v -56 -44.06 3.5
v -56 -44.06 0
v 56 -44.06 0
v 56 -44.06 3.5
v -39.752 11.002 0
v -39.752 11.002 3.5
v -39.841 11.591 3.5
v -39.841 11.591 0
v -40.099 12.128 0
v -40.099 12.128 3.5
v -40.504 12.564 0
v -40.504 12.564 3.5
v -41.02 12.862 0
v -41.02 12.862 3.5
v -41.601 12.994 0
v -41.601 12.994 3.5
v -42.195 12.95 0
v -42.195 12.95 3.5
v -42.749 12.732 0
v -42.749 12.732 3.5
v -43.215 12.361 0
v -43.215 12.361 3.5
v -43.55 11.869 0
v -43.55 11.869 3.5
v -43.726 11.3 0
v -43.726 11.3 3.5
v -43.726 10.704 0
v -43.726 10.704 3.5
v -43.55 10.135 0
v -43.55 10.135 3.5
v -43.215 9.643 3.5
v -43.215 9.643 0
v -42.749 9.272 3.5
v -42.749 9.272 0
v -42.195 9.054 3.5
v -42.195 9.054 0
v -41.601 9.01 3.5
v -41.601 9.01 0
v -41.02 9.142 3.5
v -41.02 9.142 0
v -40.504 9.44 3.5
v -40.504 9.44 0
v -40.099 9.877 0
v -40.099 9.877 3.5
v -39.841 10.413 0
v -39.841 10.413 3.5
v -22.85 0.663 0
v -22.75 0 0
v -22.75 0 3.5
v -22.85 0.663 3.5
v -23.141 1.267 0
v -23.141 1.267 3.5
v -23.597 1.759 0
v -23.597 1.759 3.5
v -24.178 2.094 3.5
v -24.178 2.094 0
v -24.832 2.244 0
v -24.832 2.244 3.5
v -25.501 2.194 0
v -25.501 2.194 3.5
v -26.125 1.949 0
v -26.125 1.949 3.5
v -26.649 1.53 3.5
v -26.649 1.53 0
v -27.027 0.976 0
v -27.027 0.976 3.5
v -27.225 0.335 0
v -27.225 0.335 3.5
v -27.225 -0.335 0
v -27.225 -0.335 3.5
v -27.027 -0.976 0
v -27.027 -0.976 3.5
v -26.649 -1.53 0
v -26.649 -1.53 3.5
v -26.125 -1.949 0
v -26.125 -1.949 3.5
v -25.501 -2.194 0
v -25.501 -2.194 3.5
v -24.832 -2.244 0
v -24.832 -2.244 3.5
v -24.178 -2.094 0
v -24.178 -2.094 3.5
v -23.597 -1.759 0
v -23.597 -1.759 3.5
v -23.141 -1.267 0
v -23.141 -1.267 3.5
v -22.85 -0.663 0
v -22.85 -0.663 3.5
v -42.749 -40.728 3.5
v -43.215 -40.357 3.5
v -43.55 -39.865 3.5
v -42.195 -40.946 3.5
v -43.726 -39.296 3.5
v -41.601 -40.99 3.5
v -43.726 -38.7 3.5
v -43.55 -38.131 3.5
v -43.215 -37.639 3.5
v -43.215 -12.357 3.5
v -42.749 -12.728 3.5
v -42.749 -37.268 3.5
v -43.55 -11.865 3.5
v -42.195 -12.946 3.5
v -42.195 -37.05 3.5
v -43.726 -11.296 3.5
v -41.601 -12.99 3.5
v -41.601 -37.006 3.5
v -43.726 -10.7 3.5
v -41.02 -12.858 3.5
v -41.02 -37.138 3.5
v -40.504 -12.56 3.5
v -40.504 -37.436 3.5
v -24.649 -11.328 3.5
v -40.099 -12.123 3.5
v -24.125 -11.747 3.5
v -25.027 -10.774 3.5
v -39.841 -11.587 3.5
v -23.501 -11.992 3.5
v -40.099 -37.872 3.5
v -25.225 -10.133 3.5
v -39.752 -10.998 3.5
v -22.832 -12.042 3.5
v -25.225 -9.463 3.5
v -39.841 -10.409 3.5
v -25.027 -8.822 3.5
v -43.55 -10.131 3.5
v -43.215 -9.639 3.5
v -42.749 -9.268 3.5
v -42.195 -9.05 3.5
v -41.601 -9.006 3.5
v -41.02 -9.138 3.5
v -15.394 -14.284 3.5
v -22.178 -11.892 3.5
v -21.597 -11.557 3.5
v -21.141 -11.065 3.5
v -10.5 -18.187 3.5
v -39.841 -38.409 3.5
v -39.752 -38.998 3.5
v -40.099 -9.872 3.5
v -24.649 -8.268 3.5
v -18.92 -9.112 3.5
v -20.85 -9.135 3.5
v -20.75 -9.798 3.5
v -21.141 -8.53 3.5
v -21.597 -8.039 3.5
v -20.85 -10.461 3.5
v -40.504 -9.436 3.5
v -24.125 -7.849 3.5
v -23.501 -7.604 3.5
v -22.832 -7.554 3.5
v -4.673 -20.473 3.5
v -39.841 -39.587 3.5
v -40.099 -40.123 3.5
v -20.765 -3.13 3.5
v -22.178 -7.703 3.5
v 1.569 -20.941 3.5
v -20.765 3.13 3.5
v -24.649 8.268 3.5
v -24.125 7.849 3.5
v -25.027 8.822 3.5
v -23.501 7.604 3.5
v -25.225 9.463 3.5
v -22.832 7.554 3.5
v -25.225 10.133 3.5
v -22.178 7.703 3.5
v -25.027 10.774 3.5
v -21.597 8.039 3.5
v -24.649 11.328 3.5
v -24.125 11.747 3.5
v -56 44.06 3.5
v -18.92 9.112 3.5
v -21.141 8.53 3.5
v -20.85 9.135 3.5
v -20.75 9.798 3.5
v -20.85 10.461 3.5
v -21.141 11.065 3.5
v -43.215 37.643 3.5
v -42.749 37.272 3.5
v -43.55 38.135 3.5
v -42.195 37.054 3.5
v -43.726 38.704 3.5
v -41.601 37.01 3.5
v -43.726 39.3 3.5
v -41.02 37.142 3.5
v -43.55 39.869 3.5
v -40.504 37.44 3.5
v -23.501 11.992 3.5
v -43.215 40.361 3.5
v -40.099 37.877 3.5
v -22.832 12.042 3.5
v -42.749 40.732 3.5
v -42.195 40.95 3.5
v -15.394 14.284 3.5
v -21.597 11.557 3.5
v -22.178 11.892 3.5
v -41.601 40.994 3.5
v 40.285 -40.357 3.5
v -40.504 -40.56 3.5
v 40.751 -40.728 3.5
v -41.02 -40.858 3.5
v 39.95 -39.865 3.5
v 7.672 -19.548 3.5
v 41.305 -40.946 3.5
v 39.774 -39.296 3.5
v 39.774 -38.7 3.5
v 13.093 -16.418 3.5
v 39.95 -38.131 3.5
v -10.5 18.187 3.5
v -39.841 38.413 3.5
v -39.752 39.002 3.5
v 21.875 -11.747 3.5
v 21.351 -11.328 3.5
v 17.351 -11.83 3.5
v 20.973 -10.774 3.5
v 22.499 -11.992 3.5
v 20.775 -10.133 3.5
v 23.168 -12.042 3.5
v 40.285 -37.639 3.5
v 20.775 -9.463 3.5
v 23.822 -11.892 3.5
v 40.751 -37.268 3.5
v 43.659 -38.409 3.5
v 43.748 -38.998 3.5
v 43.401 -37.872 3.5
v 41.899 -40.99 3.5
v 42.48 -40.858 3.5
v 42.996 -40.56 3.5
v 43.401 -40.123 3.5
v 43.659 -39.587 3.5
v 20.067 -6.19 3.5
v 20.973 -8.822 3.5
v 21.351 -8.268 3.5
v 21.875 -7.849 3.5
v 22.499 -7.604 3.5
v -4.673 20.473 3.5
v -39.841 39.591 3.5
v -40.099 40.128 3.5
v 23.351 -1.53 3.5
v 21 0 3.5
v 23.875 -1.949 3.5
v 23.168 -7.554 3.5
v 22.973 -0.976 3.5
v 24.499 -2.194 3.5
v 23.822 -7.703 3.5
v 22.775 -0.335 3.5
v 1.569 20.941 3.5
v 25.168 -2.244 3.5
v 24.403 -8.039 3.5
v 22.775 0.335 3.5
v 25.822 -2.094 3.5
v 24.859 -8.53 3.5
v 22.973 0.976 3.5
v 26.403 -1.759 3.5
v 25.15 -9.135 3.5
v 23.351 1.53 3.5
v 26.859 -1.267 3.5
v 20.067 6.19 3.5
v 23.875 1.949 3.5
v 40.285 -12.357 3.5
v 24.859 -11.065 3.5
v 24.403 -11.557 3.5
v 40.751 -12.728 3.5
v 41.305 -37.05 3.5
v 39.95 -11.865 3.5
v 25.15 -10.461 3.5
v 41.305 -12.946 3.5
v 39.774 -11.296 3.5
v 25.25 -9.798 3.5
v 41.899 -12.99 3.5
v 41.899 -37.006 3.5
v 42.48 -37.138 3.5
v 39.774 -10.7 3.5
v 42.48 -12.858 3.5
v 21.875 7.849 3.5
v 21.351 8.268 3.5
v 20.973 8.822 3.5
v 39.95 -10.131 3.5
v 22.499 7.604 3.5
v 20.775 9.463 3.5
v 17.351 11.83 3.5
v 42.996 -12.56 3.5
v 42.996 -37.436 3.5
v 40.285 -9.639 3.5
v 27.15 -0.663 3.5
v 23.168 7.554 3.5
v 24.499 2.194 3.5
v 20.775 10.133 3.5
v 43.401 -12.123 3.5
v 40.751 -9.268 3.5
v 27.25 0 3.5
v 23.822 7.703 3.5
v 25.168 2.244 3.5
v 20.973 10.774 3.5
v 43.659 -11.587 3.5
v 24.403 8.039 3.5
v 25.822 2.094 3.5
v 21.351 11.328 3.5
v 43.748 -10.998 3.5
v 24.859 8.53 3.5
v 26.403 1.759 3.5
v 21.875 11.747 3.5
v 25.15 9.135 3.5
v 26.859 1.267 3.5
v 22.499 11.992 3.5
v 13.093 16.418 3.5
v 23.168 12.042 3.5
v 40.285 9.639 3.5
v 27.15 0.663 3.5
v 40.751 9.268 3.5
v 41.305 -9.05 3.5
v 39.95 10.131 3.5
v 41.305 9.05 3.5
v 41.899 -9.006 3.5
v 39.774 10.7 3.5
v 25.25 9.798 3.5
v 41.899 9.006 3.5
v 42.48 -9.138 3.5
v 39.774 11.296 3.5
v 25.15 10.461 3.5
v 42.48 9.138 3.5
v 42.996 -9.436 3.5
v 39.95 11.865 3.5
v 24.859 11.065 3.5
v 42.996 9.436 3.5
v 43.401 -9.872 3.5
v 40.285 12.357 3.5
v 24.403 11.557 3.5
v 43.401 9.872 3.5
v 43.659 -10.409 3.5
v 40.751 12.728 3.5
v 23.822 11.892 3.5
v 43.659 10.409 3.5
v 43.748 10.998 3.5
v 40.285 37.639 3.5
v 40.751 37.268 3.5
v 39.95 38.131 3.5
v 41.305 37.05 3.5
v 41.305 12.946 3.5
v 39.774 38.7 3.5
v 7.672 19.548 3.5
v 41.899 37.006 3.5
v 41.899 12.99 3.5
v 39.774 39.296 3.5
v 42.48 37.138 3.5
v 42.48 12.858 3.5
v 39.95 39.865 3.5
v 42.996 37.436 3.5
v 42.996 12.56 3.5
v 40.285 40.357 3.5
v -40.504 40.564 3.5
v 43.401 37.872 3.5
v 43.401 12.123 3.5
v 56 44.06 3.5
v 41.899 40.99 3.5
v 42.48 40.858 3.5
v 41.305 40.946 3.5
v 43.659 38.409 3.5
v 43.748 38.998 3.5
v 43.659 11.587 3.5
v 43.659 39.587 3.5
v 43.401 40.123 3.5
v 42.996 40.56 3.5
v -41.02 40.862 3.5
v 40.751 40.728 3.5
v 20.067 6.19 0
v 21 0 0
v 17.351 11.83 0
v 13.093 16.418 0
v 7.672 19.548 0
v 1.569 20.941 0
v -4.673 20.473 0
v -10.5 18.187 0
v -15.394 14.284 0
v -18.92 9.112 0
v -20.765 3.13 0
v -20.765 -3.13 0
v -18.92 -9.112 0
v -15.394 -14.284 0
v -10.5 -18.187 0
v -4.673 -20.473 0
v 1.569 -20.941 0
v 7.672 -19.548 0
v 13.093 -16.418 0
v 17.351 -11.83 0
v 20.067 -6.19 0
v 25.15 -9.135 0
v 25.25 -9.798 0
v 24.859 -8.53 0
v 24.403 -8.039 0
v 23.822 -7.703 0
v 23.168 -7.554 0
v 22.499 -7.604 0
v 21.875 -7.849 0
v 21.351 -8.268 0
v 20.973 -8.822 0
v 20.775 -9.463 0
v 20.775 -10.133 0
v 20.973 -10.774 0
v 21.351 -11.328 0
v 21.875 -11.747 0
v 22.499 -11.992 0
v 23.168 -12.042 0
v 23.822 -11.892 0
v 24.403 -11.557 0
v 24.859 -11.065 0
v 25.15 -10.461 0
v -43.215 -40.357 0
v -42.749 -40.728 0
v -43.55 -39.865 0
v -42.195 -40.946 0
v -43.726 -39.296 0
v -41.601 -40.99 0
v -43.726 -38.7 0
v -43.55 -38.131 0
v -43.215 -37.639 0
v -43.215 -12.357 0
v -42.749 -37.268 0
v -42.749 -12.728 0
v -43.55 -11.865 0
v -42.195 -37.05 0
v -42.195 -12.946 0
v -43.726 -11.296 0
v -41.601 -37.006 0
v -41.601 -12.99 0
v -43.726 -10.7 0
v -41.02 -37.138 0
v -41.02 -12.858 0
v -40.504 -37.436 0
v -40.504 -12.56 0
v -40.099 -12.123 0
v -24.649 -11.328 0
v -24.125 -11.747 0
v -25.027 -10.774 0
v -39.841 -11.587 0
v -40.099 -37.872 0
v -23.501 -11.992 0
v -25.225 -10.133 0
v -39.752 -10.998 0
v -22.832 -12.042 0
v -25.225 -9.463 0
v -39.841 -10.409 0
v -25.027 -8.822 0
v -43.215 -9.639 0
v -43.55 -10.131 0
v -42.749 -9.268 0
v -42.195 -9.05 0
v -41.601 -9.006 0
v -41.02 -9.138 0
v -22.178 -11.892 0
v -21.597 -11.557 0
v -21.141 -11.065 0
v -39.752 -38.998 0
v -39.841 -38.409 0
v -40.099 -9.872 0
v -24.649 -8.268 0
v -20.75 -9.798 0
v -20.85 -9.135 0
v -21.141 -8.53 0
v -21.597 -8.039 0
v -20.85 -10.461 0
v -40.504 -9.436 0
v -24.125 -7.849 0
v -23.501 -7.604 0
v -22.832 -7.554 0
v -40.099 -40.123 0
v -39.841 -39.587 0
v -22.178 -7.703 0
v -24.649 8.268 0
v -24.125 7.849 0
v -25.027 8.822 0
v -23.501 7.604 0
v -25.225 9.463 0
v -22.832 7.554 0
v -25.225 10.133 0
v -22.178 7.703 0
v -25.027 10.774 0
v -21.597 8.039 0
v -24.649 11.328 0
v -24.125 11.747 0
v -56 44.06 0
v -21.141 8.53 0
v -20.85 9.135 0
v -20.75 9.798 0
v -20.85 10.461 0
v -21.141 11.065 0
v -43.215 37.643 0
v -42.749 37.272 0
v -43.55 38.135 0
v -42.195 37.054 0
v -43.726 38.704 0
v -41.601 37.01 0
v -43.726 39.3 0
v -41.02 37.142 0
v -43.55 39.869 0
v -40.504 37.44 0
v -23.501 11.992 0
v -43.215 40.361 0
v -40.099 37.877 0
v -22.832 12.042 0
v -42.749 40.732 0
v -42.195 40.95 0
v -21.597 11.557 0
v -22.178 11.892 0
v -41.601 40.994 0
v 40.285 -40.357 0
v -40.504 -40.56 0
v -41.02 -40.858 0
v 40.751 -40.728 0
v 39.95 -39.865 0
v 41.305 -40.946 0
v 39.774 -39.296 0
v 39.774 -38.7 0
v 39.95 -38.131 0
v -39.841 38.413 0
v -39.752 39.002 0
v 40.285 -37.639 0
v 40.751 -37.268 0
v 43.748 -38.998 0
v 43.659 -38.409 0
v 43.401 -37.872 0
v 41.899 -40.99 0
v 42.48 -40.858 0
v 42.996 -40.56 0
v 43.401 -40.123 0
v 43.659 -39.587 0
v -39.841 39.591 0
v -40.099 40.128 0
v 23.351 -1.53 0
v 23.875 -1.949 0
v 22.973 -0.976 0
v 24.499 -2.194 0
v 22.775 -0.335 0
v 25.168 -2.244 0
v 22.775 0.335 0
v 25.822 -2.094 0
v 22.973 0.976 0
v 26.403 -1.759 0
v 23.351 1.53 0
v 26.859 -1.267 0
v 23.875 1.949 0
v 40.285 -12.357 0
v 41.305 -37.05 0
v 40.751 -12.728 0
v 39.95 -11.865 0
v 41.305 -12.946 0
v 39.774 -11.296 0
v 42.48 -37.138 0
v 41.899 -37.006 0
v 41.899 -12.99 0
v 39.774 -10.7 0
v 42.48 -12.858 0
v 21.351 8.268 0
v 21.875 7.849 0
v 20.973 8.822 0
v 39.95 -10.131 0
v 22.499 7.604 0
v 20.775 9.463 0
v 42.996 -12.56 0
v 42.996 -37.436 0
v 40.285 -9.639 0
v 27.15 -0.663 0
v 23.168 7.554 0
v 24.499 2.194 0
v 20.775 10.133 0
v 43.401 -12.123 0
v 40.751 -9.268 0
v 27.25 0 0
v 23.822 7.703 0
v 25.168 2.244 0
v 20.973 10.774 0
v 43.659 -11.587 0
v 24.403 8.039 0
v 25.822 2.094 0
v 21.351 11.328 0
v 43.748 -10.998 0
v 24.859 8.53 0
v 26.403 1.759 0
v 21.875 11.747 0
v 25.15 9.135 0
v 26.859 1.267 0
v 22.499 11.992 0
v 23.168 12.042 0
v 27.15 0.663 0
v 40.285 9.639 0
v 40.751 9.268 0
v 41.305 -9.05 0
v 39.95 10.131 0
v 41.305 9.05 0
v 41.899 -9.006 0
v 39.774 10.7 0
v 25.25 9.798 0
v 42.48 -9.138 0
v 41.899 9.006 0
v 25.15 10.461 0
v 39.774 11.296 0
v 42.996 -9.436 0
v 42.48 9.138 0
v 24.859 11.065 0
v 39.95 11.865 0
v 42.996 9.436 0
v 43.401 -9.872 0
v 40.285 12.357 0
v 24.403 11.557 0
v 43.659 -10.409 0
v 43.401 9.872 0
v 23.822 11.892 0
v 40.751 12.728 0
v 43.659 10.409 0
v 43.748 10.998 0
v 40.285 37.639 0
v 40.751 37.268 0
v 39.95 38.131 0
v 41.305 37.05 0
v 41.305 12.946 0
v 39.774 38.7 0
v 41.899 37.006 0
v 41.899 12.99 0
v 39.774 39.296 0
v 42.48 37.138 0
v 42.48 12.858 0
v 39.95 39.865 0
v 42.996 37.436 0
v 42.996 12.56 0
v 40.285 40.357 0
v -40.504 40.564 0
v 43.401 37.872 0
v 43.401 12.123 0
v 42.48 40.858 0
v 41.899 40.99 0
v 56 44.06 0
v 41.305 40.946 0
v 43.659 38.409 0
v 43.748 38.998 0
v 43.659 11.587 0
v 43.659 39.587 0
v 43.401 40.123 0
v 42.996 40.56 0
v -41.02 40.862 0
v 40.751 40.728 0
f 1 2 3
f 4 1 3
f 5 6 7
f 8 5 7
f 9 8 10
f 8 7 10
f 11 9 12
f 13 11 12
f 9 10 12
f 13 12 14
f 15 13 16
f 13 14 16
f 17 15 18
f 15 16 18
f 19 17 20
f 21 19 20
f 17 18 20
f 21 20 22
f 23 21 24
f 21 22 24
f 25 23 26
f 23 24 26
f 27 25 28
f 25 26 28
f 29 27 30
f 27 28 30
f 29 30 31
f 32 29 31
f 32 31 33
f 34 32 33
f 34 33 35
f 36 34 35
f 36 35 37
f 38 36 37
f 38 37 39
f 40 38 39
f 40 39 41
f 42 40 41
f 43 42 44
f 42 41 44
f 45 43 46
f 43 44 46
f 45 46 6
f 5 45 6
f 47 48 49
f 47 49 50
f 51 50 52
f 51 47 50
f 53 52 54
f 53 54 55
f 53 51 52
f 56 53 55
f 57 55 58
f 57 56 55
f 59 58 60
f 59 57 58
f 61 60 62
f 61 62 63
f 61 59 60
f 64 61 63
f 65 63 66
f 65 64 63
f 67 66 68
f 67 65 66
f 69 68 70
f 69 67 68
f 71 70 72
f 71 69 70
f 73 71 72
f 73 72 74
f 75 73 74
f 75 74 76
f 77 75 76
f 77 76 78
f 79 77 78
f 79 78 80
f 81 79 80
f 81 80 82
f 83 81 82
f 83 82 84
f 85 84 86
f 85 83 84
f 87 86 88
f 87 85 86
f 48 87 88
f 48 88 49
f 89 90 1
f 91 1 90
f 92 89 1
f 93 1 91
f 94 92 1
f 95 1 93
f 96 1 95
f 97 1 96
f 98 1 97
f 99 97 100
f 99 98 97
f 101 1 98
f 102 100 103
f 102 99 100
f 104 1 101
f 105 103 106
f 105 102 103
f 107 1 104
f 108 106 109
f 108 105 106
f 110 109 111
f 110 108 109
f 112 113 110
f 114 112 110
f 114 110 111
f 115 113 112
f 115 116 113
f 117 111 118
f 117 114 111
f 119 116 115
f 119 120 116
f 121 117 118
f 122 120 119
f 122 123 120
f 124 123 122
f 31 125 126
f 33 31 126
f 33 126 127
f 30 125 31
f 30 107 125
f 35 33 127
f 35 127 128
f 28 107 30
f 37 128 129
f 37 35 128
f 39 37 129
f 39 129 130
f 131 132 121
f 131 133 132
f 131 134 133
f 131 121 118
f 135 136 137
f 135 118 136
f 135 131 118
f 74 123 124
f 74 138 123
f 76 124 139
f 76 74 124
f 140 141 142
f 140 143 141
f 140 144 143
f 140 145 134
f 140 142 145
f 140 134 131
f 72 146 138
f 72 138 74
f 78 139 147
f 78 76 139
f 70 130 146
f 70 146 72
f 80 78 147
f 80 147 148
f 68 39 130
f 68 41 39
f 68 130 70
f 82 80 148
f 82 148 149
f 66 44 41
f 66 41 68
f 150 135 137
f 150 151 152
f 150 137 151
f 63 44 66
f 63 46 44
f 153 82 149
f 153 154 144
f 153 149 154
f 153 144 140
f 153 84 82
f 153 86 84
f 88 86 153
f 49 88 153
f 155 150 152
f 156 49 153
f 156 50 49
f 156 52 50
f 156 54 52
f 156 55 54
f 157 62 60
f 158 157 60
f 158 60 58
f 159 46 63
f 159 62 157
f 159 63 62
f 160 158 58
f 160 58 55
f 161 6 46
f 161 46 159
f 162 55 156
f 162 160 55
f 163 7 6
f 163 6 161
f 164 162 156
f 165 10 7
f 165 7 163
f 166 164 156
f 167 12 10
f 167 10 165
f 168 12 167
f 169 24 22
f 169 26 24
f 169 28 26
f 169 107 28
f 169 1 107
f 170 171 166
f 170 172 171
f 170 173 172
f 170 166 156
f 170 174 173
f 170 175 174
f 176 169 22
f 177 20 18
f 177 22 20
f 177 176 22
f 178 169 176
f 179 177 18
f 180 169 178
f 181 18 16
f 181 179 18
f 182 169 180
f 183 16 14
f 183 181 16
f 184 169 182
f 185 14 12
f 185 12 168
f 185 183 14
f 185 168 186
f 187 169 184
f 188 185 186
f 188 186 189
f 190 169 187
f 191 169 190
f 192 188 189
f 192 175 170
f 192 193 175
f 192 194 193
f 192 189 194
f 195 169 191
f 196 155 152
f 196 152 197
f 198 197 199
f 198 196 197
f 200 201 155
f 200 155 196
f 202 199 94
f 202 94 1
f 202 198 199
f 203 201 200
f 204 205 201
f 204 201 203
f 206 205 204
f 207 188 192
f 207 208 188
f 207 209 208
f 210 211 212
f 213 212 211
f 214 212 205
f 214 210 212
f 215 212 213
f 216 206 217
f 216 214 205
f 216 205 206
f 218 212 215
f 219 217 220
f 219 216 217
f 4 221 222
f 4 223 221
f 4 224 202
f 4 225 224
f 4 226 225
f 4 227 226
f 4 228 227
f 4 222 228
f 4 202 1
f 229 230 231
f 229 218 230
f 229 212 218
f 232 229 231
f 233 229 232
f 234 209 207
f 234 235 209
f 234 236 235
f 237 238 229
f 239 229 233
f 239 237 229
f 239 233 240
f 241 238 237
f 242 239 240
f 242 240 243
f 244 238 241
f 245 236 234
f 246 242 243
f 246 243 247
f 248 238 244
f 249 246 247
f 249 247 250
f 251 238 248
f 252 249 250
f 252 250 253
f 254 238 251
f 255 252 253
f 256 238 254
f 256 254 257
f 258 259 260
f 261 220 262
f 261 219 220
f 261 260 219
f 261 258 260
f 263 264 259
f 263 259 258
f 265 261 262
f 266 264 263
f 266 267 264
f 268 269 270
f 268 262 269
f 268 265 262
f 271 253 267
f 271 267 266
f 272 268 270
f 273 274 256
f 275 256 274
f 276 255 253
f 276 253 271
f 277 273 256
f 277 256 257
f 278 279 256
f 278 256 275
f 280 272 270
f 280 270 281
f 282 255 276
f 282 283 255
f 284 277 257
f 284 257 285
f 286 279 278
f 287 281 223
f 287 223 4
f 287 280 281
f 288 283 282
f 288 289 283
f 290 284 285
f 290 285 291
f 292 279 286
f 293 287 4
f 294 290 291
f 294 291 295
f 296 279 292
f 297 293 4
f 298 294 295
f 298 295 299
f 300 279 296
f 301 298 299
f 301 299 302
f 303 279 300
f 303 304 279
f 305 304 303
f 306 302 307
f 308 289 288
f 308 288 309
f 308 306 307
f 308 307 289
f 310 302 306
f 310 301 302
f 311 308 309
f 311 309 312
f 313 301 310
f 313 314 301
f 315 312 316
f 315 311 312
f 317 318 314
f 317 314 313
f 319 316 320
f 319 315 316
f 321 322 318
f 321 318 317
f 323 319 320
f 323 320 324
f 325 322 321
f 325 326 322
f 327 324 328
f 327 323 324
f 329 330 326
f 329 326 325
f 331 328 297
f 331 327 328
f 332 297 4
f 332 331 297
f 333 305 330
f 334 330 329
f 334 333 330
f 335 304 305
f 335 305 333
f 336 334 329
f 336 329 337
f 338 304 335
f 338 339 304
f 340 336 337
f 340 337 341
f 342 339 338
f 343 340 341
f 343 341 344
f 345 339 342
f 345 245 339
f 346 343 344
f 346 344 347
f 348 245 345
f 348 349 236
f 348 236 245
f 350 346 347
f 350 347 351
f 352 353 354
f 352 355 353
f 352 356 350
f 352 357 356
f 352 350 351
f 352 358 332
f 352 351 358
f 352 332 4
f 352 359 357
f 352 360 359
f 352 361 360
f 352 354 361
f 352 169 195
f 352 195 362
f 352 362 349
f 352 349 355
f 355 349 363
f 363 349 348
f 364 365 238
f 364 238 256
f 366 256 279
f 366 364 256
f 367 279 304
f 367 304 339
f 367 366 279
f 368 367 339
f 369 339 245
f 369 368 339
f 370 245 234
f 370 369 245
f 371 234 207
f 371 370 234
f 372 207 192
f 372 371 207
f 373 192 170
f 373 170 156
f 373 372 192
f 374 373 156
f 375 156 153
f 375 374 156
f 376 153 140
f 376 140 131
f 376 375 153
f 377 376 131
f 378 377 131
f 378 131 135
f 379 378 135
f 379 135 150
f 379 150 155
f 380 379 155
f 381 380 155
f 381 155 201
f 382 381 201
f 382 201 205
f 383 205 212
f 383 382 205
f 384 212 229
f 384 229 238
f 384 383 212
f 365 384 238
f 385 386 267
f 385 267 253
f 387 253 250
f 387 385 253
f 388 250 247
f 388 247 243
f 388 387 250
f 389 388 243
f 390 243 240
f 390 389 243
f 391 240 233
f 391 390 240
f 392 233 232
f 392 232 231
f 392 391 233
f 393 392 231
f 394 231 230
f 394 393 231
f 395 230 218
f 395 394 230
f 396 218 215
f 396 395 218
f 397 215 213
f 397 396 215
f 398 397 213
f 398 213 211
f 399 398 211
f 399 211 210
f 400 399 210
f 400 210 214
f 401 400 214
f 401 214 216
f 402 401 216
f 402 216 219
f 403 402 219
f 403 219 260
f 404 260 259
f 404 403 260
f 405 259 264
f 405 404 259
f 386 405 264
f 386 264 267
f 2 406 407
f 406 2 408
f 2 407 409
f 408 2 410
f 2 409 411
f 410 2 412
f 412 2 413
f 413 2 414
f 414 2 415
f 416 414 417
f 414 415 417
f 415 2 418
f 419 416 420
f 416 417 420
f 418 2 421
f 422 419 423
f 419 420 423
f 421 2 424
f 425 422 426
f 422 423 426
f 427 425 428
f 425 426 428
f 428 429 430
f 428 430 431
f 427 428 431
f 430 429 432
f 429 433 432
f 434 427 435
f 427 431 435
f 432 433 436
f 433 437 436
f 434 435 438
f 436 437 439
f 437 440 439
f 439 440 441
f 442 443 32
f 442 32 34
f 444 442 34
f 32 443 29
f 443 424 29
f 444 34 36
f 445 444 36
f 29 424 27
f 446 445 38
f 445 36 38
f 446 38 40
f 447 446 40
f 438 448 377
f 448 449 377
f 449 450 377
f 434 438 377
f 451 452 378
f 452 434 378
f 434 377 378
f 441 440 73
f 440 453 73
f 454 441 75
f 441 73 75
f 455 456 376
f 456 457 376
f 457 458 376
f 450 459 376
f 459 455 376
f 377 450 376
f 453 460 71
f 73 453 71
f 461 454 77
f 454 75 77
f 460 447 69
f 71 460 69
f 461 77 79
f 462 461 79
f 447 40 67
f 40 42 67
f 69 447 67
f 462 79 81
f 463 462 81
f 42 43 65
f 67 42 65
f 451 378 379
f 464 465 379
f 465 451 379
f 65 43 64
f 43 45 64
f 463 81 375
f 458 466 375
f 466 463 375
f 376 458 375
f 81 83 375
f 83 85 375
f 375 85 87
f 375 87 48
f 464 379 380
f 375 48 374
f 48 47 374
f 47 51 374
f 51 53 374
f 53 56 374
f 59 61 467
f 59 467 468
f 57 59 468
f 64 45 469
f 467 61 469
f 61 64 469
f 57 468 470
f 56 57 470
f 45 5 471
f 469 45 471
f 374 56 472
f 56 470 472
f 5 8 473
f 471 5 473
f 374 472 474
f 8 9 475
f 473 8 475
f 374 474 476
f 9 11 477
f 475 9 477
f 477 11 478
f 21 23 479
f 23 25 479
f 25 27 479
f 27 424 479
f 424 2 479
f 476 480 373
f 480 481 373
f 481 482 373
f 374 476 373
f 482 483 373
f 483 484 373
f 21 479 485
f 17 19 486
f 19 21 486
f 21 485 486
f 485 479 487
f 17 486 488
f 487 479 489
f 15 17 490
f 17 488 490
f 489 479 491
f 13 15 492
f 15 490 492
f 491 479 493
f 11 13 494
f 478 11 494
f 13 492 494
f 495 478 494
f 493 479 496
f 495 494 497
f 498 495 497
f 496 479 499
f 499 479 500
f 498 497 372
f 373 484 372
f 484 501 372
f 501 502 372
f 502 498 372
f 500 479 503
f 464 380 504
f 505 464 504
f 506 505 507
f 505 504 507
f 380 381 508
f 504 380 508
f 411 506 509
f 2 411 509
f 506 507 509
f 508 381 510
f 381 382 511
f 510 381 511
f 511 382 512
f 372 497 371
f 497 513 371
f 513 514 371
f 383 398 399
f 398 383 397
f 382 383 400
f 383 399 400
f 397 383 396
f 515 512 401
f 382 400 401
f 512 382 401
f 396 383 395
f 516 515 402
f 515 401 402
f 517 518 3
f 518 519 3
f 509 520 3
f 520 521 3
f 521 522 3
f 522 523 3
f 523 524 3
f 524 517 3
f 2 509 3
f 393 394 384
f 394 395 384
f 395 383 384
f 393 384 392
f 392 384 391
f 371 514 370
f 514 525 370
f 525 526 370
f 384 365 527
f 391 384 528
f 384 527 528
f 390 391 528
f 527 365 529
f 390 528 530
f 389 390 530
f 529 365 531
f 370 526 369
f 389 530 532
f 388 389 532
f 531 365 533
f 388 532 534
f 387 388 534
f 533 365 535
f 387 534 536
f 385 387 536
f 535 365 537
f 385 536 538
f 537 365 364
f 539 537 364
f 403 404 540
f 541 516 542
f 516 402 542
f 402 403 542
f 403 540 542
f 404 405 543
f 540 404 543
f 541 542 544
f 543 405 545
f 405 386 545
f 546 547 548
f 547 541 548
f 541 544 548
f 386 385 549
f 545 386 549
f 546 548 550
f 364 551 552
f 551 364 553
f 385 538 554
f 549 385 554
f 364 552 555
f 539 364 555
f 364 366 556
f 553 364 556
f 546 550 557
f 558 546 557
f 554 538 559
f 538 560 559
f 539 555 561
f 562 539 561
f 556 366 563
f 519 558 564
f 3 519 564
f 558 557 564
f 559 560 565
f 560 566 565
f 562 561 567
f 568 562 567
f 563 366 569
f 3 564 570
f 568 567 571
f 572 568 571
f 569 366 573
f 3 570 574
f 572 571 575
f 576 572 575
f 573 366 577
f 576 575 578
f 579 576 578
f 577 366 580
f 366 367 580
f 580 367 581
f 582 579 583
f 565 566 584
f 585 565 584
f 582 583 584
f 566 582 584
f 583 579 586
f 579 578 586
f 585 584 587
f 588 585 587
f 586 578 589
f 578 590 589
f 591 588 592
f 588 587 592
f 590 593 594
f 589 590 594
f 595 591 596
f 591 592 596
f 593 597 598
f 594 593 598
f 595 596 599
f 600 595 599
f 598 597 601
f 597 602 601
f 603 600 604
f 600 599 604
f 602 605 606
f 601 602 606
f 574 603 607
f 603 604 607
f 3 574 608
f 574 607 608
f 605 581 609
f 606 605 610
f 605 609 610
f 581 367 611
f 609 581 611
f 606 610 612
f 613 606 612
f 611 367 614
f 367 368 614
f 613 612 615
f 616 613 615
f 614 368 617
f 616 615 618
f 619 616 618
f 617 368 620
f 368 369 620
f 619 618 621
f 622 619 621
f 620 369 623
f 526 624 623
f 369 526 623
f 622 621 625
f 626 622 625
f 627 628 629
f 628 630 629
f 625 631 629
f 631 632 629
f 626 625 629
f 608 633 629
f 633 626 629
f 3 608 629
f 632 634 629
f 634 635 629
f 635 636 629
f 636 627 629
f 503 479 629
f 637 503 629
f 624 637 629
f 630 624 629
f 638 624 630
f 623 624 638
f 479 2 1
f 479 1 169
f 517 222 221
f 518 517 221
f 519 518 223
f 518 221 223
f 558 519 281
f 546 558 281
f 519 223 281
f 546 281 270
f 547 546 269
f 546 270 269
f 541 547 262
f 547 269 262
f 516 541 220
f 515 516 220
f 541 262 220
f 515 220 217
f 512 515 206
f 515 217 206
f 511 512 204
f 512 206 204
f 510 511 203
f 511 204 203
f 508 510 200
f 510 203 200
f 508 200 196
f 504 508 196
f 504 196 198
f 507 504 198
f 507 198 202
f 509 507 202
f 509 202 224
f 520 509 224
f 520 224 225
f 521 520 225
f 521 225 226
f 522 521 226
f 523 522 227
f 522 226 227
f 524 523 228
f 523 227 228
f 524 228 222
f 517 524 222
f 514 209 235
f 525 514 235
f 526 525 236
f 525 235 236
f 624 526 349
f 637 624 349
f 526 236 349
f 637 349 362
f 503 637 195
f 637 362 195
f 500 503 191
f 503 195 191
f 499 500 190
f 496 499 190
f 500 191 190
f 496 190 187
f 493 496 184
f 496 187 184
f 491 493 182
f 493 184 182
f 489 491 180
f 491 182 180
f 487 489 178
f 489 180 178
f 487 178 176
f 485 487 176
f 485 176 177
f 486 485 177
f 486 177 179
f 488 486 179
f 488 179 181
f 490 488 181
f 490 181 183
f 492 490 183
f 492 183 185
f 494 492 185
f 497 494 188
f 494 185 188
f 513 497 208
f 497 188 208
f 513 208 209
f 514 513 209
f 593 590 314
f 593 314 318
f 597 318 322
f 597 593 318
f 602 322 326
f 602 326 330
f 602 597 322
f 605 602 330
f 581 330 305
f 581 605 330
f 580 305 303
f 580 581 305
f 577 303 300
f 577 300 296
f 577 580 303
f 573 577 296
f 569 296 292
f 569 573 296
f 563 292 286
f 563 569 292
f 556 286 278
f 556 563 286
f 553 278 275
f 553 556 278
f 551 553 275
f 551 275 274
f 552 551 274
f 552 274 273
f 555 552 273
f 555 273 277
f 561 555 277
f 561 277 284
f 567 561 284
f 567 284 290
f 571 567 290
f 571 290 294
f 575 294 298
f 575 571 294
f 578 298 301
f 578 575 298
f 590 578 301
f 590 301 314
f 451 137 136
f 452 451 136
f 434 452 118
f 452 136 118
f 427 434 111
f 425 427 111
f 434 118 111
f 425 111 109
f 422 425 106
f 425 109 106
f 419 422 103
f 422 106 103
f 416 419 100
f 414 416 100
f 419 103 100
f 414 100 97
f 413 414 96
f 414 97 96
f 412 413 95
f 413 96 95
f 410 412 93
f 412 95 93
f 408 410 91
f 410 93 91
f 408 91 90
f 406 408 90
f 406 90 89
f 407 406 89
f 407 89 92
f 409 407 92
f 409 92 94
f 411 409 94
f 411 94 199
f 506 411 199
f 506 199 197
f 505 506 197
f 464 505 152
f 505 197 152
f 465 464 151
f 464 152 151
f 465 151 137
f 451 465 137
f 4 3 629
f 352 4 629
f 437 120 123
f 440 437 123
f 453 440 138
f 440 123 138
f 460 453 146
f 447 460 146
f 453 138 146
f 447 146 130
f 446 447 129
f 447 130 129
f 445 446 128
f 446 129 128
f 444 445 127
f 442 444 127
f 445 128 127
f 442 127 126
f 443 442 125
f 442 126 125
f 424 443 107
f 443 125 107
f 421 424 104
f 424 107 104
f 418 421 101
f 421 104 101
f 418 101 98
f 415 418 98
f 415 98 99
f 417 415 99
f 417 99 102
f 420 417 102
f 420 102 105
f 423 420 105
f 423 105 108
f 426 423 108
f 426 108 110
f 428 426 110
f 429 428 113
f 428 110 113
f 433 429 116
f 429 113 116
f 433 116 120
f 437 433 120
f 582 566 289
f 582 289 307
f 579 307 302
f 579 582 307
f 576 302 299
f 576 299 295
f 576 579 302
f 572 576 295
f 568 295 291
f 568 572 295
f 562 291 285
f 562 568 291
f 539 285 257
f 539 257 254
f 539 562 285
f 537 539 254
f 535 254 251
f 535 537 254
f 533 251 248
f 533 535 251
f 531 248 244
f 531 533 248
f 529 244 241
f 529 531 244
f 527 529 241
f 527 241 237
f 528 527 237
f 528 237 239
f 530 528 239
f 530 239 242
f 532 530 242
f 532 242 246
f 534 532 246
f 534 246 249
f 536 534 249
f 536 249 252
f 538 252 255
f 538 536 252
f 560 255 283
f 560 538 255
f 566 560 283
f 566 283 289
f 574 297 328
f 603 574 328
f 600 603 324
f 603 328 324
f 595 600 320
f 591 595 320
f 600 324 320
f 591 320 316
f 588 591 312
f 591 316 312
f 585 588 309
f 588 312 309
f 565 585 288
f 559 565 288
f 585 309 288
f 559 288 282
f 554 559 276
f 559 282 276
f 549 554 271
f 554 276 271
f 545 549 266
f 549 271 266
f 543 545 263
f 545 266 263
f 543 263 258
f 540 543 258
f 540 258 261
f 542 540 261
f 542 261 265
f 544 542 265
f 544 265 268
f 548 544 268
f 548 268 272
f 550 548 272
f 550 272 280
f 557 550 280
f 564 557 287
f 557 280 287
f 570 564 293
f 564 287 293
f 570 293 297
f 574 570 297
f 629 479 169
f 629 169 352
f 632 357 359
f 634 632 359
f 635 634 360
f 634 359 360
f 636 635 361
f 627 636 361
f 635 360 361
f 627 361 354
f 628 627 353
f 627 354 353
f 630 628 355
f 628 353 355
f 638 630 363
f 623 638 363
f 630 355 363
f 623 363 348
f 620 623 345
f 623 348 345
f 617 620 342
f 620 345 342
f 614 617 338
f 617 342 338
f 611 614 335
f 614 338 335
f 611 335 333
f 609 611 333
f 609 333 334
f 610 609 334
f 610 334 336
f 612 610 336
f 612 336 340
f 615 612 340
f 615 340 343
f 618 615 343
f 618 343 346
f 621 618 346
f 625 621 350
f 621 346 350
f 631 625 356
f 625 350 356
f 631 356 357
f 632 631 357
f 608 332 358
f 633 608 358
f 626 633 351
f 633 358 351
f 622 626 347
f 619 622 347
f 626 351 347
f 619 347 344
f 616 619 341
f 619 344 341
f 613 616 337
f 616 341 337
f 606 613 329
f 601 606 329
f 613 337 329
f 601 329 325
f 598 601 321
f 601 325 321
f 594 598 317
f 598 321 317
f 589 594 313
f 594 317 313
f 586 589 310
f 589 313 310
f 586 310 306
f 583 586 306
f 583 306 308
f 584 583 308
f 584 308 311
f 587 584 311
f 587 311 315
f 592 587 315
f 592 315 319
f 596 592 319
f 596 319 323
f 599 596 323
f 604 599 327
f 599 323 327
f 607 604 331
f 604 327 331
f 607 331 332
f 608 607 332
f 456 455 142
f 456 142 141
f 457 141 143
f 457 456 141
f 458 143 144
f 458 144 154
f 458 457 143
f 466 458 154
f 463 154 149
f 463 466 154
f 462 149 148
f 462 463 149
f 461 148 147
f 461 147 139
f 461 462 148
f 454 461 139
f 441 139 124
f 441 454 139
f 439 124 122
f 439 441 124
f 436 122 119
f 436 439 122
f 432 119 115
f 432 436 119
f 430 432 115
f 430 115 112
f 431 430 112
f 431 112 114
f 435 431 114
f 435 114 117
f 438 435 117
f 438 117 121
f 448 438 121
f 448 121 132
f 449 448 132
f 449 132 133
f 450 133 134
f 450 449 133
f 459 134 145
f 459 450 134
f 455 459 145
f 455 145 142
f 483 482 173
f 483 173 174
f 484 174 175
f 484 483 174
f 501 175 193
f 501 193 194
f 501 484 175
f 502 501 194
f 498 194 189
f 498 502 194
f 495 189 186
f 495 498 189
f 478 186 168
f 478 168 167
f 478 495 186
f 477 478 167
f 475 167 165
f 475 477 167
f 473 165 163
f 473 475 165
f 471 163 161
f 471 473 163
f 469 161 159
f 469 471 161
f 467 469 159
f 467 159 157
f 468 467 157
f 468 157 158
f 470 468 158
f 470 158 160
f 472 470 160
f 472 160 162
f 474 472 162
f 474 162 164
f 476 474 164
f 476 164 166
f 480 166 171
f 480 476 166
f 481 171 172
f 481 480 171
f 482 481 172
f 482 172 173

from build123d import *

# Parameters (mm, degrees)
SKETCH1_W           = 112
SKETCH1_H           = 88.12
SKETCH1_R           = 21
SKETCH1_R_2         = 2.25
BOSS_EXTRUDE1_DEPTH = 3.5
SKETCH2_R           = 1.997849158
SKETCH2_R_2         = 1.997849136
SKETCH2_R_3         = 1.997849041
SKETCH2_R_4         = 1.99784915
CUT_EXTRUDE1_DEPTH  = 3.5


with BuildPart() as part:
    # Sketch1 → Boss-Extrude1 (new body)
    with BuildSketch(Plane.XY):
        Rectangle(SKETCH1_W, SKETCH1_H)
        Circle(SKETCH1_R, mode=Mode.SUBTRACT)
        with Locations((25, 0)):
            Circle(SKETCH1_R_2, mode=Mode.SUBTRACT)
        with Locations((23, 9.797958971)):
            Circle(SKETCH1_R_2, mode=Mode.SUBTRACT)
        with Locations((23, -9.797958971)):
            Circle(SKETCH1_R_2, mode=Mode.SUBTRACT)
        with Locations((-23, 9.797958971)):
            Circle(SKETCH1_R_2, mode=Mode.SUBTRACT)
        with Locations((-25, 0)):
            Circle(SKETCH1_R_2, mode=Mode.SUBTRACT)
        with Locations((-23, -9.797958971)):
            Circle(SKETCH1_R_2, mode=Mode.SUBTRACT)
    extrude(amount=BOSS_EXTRUDE1_DEPTH)

    # Sketch2 → Cut-Extrude1 (cut)
    with BuildSketch(Plane.XY.offset(3.5)):
        with Locations((-41.749999967, 11.002177996)):
            Circle(SKETCH2_R)
        with Locations((41.750000033, 38.997821996)):
            Circle(SKETCH2_R)
        with Locations((-41.749999967, 39.002177996)):
            Circle(SKETCH2_R)
        with Locations((41.750000033, 10.997821996)):
            Circle(SKETCH2_R)
        with Locations((41.75, -10.997822003)):
            Circle(SKETCH2_R_2)
        with Locations((41.75, -38.997822003)):
            Circle(SKETCH2_R_2)
        with Locations((-41.749999857, -38.997821959)):
            Circle(SKETCH2_R_3)
        with Locations((-41.749999952, -10.997822035)):
            Circle(SKETCH2_R_4)
    extrude(amount=-CUT_EXTRUDE1_DEPTH, mode=Mode.SUBTRACT)


solid = part.part
